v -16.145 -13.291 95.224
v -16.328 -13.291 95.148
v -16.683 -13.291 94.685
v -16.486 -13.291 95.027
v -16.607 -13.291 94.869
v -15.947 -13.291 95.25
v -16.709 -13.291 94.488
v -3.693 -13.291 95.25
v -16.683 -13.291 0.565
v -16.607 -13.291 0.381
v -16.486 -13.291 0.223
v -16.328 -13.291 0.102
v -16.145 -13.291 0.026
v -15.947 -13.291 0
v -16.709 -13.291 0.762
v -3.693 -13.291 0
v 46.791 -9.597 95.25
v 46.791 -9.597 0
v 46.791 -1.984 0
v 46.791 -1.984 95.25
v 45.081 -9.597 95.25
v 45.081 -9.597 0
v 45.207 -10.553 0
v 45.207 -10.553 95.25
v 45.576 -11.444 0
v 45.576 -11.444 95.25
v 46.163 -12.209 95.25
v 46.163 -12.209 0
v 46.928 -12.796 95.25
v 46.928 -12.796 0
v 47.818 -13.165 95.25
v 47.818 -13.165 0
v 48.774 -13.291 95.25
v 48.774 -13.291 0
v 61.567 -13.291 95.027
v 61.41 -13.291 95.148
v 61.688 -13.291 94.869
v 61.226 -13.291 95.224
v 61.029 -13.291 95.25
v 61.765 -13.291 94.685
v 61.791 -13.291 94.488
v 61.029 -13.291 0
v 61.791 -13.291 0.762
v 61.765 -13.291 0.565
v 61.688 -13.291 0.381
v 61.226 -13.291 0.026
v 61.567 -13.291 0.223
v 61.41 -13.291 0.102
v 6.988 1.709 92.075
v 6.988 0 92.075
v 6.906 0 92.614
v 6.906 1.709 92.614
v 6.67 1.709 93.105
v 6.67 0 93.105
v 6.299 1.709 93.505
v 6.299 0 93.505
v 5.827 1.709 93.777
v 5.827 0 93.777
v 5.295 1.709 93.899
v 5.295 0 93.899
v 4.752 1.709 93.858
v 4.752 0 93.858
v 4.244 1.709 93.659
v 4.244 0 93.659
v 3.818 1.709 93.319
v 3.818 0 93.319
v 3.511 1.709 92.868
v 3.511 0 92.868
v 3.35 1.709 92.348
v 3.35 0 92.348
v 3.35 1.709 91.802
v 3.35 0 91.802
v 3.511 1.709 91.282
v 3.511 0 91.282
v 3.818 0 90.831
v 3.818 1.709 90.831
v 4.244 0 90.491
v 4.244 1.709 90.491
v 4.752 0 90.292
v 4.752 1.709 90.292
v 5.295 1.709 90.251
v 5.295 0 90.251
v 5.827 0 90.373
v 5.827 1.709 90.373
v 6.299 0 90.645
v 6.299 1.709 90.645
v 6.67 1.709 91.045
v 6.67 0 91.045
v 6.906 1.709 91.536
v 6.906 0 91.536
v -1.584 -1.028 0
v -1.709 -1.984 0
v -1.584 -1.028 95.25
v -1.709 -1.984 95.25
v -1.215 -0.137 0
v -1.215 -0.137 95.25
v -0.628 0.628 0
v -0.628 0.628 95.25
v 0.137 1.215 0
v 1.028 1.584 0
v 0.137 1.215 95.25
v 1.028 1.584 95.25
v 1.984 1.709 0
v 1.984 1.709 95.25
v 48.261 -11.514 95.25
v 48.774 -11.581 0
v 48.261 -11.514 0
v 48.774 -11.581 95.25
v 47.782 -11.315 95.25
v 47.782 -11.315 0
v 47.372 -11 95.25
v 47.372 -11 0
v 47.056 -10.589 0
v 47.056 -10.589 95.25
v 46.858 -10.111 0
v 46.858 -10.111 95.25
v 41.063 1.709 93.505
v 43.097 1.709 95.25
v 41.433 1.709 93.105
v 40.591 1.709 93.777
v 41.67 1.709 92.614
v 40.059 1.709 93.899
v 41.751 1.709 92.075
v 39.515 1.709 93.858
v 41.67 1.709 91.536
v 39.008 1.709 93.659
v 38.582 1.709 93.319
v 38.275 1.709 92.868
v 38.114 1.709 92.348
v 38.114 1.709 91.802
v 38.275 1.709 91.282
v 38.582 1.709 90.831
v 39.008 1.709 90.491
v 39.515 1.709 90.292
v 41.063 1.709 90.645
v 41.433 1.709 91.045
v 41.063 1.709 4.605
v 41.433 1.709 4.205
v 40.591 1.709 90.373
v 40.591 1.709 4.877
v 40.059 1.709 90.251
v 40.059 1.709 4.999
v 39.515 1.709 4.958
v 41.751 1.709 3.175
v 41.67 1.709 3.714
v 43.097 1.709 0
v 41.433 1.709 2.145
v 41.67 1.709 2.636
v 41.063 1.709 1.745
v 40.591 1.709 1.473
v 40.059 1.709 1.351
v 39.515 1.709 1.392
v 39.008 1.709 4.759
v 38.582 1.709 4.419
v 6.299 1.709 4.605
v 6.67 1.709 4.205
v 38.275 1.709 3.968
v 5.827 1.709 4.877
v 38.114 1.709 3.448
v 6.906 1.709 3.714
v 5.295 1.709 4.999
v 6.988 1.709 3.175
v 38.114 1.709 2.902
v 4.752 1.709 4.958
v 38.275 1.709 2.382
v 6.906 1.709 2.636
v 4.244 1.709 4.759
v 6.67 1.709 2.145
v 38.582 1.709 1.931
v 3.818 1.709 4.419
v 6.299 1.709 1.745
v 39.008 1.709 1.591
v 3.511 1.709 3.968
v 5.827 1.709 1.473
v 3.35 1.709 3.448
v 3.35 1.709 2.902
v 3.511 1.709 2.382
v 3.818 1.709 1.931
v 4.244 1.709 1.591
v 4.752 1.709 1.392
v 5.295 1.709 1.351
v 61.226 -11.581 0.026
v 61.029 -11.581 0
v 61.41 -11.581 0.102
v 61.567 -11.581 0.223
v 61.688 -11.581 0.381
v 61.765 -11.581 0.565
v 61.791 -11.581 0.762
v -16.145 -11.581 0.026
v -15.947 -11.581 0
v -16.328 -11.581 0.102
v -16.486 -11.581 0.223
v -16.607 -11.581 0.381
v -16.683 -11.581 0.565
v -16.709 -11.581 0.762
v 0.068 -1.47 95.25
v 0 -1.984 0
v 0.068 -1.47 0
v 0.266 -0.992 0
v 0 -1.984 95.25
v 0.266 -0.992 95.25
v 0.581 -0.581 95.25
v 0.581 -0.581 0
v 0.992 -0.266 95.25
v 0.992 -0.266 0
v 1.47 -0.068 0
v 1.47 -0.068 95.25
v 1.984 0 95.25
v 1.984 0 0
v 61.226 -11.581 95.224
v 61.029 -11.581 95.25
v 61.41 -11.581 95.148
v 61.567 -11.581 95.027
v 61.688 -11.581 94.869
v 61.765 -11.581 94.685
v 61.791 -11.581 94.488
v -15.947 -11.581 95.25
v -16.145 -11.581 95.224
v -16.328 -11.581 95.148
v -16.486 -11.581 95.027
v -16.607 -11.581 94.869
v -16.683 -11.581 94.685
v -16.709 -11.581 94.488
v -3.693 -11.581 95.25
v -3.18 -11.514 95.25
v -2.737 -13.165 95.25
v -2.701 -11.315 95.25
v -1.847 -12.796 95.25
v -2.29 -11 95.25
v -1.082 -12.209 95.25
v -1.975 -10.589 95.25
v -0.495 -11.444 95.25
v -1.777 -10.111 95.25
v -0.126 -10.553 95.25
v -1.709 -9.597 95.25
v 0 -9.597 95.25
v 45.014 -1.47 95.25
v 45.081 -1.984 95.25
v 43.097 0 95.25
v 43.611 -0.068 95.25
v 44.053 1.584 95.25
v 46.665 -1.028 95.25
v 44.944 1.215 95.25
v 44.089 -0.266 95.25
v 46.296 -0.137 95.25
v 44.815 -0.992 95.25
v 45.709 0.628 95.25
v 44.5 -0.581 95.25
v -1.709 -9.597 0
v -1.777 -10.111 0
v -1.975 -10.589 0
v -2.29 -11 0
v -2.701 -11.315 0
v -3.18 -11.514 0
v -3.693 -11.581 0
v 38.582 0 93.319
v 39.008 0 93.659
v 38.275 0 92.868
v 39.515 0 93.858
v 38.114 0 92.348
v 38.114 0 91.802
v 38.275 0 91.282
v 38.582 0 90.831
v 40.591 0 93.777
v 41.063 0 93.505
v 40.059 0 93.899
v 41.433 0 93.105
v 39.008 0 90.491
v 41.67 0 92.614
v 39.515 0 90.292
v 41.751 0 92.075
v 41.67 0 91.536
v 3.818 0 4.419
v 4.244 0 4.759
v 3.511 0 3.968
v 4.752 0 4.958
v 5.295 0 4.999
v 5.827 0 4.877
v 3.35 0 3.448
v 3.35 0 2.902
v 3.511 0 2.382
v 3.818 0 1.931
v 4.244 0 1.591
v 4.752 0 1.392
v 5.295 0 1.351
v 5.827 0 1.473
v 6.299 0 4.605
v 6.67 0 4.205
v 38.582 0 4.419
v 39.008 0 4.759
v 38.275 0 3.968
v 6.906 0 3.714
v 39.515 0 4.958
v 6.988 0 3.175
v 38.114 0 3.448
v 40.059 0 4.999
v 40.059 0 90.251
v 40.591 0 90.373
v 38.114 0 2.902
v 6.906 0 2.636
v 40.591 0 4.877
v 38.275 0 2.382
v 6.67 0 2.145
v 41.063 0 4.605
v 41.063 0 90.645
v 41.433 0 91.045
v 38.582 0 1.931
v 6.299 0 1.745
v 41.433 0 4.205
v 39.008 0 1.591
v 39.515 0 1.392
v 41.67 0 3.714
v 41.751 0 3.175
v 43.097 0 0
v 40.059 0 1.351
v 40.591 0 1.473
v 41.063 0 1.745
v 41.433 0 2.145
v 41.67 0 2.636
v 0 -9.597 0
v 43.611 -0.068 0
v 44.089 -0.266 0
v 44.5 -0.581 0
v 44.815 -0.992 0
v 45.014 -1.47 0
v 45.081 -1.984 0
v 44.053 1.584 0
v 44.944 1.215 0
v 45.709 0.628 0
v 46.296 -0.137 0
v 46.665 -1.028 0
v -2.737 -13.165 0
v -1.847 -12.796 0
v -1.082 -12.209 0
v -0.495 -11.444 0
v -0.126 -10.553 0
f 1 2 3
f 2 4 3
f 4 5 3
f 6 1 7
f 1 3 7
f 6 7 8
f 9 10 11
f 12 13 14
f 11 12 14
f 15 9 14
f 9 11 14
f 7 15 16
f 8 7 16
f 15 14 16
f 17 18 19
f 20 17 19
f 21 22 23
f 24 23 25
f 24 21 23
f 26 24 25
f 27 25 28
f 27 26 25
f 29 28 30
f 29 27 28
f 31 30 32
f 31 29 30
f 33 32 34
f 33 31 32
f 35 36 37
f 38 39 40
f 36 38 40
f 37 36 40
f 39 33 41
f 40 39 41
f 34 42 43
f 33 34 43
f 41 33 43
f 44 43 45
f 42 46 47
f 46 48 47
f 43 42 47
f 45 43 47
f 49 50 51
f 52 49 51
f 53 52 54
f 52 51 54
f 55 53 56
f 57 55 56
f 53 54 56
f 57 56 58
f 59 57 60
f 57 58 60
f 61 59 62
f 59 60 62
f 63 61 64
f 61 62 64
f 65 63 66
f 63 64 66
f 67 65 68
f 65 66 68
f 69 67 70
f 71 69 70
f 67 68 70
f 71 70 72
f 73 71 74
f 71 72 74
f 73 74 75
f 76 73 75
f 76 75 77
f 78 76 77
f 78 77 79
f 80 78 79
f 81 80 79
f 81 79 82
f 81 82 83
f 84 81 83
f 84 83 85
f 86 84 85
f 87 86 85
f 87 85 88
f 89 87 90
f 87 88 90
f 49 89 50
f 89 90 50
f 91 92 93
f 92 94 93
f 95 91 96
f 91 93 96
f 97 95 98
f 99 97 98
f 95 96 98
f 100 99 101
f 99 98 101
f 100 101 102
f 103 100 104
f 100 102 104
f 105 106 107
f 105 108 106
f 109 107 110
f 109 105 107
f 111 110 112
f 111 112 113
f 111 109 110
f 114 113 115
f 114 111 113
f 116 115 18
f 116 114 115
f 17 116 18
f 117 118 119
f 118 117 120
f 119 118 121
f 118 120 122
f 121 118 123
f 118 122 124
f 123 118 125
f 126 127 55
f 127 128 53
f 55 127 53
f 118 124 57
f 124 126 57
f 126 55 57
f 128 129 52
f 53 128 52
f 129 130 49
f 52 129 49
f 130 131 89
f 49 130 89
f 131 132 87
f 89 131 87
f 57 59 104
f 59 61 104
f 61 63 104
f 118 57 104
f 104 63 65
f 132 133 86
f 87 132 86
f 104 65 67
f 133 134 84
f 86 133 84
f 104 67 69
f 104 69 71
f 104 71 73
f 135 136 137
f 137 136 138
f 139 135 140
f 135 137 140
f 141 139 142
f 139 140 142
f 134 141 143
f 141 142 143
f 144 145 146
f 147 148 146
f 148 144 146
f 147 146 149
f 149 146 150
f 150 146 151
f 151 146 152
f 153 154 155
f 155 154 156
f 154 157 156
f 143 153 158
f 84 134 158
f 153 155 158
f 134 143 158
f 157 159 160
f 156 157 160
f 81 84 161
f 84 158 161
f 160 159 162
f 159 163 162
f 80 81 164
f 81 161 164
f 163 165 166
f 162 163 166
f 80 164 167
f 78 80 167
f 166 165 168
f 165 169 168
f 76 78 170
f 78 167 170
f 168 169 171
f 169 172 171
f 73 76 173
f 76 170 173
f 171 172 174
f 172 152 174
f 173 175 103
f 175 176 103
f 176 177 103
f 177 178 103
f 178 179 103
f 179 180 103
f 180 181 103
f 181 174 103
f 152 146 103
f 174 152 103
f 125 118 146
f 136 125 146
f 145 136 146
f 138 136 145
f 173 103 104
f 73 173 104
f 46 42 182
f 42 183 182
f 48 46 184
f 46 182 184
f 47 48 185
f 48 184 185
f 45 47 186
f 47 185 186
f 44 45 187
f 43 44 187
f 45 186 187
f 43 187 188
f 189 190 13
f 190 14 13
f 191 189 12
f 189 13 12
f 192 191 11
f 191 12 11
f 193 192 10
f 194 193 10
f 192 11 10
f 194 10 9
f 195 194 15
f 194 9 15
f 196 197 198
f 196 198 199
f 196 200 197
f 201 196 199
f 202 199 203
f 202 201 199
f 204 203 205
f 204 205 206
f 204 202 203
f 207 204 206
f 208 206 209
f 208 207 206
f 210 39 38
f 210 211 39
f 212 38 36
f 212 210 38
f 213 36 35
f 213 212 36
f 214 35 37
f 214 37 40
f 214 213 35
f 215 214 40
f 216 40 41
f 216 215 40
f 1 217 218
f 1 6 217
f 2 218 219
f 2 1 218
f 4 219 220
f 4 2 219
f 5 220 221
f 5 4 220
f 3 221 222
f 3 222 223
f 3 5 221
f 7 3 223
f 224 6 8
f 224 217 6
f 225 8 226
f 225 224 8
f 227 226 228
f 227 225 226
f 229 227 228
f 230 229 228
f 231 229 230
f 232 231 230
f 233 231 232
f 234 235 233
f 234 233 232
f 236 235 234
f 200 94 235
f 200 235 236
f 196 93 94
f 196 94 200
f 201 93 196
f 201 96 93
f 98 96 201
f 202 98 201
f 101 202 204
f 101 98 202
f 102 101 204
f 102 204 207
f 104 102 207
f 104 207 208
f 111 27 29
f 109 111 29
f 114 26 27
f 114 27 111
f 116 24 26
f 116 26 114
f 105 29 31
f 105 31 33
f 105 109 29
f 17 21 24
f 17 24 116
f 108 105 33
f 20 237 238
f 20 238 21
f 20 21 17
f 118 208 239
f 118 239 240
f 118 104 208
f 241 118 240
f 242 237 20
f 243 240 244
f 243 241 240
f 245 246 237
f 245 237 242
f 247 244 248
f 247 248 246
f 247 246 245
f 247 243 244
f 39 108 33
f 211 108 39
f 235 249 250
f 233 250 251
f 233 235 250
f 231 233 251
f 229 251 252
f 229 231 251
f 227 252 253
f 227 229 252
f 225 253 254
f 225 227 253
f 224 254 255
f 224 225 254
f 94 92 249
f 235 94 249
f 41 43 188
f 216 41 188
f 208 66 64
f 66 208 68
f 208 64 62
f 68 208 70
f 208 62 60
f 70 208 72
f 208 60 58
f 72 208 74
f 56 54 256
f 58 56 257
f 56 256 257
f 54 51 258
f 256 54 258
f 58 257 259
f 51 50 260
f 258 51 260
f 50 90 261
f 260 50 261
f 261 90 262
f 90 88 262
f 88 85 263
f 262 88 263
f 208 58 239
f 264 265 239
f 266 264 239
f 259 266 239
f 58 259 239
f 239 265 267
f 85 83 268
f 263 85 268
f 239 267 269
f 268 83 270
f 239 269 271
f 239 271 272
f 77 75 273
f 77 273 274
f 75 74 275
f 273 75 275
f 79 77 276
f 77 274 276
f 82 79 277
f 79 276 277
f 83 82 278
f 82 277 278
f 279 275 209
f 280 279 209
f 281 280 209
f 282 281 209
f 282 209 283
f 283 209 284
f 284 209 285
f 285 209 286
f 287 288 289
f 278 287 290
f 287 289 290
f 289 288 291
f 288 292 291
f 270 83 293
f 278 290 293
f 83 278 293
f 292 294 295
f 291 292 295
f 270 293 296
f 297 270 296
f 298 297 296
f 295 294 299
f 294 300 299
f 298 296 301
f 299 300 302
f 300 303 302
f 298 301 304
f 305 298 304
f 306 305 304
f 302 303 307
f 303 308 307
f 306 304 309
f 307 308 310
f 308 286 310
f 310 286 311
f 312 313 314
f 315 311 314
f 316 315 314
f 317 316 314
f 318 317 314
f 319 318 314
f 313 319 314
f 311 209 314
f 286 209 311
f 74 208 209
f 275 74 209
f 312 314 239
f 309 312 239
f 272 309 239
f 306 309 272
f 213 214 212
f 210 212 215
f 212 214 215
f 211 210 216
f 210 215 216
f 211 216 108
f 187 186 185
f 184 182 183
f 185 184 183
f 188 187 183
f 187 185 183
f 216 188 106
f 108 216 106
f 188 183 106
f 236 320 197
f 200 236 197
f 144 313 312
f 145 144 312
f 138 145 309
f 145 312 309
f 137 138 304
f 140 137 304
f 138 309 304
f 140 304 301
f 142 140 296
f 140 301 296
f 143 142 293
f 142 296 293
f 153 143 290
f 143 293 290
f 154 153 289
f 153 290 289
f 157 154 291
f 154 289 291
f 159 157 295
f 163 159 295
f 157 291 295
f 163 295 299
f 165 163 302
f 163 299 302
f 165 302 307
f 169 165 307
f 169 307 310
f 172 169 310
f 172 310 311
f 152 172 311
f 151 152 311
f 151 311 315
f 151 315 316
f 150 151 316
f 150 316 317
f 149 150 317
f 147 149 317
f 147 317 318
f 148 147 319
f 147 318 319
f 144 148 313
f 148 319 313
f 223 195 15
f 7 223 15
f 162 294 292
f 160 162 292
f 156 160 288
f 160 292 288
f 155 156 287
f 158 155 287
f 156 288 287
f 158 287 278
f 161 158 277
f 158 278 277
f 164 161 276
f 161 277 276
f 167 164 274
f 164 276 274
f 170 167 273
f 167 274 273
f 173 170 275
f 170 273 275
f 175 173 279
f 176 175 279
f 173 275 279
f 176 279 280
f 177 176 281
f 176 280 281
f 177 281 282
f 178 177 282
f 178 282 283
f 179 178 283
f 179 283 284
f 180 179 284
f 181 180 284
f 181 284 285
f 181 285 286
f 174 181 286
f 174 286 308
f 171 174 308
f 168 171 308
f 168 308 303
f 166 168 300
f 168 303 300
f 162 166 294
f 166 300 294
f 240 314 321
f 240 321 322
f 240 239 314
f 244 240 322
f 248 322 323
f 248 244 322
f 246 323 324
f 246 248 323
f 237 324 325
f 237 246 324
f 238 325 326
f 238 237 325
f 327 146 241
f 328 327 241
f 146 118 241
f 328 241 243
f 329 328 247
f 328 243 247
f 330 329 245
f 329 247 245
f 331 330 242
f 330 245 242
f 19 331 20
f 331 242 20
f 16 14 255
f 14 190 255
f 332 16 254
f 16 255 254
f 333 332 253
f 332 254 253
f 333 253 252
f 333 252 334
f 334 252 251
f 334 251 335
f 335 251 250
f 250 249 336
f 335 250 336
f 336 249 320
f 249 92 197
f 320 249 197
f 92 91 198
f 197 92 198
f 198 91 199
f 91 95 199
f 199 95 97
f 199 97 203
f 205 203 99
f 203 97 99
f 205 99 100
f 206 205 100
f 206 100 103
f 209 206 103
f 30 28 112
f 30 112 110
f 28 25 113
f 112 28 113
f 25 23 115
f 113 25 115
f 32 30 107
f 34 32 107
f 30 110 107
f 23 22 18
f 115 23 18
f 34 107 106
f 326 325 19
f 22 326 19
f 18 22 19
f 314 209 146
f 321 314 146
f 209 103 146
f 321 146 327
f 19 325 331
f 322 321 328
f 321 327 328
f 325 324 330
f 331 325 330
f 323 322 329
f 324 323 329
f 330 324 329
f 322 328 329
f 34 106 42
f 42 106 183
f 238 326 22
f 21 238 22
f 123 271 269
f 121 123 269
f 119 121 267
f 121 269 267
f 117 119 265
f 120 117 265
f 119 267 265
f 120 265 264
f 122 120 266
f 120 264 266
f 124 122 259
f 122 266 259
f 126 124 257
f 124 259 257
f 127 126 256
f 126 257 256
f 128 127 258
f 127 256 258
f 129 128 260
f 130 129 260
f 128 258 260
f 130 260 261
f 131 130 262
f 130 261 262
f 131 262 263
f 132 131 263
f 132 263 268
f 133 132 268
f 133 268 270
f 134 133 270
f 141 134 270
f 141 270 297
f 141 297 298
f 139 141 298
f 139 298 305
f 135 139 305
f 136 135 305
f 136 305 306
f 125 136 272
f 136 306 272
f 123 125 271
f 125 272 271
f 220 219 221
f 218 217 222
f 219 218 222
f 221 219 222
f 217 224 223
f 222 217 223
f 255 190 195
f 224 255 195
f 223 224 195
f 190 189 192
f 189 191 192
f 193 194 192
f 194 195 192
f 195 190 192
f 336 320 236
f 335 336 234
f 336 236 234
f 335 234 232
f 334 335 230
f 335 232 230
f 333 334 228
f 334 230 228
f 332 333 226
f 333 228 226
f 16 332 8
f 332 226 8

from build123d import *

# Parameters (mm, degrees)
F1_DEPTH = 95.25
F2_R     = 1.98374
F3_R     = 3.69316
F4_R     = 0.762
F5_R     = 1.8288
F6_DEPTH = 1.70942


with BuildPart() as f1:
    # F0 (on Top) → F1 (new body)
    with BuildSketch(Plane.XY):
        Polygon((0, -13.29058), (0, 0), (45.08116, 0), (45.08116, -13.29058), (61.79058, -13.29058), (61.79058, -11.58116), (46.79058, -11.58116), (46.79058, 1.70942), (-1.70942, 1.70942), (-1.70942, -11.58116), (-16.70942, -11.58116), (-16.70942, -13.29058), align=None)
    extrude(amount=F1_DEPTH)

    # F2
    f2_edges = [f1.edges().sort_by_distance(p)[0] for p in [
        (0, 0, 47.625),
        (-1.70942, -11.58116, 47.625),
        (45.08116, 0, 47.625),
        (46.79058, -11.58116, 47.625),
    ]]
    fillet(f2_edges, radius=F2_R)

    # F3
    f3_edges = [f1.edges().sort_by_distance(p)[0] for p in [
        (0, -13.29058, 47.625),
        (-1.70942, 1.70942, 47.625),
        (46.79058, 1.70942, 47.625),
        (45.08116, -13.29058, 47.625),
    ]]
    fillet(f3_edges, radius=F3_R)

    # F4
    f4_edges = [f1.edges().sort_by_distance(p)[0] for p in [
        (-16.70942, -12.43587, 0),
        (-16.70942, -12.43587, 95.25),
        (61.79058, -12.43587, 0),
        (61.79058, -12.43587, 95.25),
    ]]
    fillet(f4_edges, radius=F4_R)

    # F5 (on face) → F6 (cut, through all)
    with BuildSketch(Plane.XZ):
        with Locations((5.15874, 92.075)):
            Circle(F5_R)
        with Locations((5.15874, 3.175)):
            Circle(F5_R)
        with Locations((39.92242, 92.075)):
            Circle(F5_R)
        with Locations((39.92242, 3.175)):
            Circle(F5_R)
    extrude(amount=-F6_DEPTH, mode=Mode.SUBTRACT)


solid = f1.part
